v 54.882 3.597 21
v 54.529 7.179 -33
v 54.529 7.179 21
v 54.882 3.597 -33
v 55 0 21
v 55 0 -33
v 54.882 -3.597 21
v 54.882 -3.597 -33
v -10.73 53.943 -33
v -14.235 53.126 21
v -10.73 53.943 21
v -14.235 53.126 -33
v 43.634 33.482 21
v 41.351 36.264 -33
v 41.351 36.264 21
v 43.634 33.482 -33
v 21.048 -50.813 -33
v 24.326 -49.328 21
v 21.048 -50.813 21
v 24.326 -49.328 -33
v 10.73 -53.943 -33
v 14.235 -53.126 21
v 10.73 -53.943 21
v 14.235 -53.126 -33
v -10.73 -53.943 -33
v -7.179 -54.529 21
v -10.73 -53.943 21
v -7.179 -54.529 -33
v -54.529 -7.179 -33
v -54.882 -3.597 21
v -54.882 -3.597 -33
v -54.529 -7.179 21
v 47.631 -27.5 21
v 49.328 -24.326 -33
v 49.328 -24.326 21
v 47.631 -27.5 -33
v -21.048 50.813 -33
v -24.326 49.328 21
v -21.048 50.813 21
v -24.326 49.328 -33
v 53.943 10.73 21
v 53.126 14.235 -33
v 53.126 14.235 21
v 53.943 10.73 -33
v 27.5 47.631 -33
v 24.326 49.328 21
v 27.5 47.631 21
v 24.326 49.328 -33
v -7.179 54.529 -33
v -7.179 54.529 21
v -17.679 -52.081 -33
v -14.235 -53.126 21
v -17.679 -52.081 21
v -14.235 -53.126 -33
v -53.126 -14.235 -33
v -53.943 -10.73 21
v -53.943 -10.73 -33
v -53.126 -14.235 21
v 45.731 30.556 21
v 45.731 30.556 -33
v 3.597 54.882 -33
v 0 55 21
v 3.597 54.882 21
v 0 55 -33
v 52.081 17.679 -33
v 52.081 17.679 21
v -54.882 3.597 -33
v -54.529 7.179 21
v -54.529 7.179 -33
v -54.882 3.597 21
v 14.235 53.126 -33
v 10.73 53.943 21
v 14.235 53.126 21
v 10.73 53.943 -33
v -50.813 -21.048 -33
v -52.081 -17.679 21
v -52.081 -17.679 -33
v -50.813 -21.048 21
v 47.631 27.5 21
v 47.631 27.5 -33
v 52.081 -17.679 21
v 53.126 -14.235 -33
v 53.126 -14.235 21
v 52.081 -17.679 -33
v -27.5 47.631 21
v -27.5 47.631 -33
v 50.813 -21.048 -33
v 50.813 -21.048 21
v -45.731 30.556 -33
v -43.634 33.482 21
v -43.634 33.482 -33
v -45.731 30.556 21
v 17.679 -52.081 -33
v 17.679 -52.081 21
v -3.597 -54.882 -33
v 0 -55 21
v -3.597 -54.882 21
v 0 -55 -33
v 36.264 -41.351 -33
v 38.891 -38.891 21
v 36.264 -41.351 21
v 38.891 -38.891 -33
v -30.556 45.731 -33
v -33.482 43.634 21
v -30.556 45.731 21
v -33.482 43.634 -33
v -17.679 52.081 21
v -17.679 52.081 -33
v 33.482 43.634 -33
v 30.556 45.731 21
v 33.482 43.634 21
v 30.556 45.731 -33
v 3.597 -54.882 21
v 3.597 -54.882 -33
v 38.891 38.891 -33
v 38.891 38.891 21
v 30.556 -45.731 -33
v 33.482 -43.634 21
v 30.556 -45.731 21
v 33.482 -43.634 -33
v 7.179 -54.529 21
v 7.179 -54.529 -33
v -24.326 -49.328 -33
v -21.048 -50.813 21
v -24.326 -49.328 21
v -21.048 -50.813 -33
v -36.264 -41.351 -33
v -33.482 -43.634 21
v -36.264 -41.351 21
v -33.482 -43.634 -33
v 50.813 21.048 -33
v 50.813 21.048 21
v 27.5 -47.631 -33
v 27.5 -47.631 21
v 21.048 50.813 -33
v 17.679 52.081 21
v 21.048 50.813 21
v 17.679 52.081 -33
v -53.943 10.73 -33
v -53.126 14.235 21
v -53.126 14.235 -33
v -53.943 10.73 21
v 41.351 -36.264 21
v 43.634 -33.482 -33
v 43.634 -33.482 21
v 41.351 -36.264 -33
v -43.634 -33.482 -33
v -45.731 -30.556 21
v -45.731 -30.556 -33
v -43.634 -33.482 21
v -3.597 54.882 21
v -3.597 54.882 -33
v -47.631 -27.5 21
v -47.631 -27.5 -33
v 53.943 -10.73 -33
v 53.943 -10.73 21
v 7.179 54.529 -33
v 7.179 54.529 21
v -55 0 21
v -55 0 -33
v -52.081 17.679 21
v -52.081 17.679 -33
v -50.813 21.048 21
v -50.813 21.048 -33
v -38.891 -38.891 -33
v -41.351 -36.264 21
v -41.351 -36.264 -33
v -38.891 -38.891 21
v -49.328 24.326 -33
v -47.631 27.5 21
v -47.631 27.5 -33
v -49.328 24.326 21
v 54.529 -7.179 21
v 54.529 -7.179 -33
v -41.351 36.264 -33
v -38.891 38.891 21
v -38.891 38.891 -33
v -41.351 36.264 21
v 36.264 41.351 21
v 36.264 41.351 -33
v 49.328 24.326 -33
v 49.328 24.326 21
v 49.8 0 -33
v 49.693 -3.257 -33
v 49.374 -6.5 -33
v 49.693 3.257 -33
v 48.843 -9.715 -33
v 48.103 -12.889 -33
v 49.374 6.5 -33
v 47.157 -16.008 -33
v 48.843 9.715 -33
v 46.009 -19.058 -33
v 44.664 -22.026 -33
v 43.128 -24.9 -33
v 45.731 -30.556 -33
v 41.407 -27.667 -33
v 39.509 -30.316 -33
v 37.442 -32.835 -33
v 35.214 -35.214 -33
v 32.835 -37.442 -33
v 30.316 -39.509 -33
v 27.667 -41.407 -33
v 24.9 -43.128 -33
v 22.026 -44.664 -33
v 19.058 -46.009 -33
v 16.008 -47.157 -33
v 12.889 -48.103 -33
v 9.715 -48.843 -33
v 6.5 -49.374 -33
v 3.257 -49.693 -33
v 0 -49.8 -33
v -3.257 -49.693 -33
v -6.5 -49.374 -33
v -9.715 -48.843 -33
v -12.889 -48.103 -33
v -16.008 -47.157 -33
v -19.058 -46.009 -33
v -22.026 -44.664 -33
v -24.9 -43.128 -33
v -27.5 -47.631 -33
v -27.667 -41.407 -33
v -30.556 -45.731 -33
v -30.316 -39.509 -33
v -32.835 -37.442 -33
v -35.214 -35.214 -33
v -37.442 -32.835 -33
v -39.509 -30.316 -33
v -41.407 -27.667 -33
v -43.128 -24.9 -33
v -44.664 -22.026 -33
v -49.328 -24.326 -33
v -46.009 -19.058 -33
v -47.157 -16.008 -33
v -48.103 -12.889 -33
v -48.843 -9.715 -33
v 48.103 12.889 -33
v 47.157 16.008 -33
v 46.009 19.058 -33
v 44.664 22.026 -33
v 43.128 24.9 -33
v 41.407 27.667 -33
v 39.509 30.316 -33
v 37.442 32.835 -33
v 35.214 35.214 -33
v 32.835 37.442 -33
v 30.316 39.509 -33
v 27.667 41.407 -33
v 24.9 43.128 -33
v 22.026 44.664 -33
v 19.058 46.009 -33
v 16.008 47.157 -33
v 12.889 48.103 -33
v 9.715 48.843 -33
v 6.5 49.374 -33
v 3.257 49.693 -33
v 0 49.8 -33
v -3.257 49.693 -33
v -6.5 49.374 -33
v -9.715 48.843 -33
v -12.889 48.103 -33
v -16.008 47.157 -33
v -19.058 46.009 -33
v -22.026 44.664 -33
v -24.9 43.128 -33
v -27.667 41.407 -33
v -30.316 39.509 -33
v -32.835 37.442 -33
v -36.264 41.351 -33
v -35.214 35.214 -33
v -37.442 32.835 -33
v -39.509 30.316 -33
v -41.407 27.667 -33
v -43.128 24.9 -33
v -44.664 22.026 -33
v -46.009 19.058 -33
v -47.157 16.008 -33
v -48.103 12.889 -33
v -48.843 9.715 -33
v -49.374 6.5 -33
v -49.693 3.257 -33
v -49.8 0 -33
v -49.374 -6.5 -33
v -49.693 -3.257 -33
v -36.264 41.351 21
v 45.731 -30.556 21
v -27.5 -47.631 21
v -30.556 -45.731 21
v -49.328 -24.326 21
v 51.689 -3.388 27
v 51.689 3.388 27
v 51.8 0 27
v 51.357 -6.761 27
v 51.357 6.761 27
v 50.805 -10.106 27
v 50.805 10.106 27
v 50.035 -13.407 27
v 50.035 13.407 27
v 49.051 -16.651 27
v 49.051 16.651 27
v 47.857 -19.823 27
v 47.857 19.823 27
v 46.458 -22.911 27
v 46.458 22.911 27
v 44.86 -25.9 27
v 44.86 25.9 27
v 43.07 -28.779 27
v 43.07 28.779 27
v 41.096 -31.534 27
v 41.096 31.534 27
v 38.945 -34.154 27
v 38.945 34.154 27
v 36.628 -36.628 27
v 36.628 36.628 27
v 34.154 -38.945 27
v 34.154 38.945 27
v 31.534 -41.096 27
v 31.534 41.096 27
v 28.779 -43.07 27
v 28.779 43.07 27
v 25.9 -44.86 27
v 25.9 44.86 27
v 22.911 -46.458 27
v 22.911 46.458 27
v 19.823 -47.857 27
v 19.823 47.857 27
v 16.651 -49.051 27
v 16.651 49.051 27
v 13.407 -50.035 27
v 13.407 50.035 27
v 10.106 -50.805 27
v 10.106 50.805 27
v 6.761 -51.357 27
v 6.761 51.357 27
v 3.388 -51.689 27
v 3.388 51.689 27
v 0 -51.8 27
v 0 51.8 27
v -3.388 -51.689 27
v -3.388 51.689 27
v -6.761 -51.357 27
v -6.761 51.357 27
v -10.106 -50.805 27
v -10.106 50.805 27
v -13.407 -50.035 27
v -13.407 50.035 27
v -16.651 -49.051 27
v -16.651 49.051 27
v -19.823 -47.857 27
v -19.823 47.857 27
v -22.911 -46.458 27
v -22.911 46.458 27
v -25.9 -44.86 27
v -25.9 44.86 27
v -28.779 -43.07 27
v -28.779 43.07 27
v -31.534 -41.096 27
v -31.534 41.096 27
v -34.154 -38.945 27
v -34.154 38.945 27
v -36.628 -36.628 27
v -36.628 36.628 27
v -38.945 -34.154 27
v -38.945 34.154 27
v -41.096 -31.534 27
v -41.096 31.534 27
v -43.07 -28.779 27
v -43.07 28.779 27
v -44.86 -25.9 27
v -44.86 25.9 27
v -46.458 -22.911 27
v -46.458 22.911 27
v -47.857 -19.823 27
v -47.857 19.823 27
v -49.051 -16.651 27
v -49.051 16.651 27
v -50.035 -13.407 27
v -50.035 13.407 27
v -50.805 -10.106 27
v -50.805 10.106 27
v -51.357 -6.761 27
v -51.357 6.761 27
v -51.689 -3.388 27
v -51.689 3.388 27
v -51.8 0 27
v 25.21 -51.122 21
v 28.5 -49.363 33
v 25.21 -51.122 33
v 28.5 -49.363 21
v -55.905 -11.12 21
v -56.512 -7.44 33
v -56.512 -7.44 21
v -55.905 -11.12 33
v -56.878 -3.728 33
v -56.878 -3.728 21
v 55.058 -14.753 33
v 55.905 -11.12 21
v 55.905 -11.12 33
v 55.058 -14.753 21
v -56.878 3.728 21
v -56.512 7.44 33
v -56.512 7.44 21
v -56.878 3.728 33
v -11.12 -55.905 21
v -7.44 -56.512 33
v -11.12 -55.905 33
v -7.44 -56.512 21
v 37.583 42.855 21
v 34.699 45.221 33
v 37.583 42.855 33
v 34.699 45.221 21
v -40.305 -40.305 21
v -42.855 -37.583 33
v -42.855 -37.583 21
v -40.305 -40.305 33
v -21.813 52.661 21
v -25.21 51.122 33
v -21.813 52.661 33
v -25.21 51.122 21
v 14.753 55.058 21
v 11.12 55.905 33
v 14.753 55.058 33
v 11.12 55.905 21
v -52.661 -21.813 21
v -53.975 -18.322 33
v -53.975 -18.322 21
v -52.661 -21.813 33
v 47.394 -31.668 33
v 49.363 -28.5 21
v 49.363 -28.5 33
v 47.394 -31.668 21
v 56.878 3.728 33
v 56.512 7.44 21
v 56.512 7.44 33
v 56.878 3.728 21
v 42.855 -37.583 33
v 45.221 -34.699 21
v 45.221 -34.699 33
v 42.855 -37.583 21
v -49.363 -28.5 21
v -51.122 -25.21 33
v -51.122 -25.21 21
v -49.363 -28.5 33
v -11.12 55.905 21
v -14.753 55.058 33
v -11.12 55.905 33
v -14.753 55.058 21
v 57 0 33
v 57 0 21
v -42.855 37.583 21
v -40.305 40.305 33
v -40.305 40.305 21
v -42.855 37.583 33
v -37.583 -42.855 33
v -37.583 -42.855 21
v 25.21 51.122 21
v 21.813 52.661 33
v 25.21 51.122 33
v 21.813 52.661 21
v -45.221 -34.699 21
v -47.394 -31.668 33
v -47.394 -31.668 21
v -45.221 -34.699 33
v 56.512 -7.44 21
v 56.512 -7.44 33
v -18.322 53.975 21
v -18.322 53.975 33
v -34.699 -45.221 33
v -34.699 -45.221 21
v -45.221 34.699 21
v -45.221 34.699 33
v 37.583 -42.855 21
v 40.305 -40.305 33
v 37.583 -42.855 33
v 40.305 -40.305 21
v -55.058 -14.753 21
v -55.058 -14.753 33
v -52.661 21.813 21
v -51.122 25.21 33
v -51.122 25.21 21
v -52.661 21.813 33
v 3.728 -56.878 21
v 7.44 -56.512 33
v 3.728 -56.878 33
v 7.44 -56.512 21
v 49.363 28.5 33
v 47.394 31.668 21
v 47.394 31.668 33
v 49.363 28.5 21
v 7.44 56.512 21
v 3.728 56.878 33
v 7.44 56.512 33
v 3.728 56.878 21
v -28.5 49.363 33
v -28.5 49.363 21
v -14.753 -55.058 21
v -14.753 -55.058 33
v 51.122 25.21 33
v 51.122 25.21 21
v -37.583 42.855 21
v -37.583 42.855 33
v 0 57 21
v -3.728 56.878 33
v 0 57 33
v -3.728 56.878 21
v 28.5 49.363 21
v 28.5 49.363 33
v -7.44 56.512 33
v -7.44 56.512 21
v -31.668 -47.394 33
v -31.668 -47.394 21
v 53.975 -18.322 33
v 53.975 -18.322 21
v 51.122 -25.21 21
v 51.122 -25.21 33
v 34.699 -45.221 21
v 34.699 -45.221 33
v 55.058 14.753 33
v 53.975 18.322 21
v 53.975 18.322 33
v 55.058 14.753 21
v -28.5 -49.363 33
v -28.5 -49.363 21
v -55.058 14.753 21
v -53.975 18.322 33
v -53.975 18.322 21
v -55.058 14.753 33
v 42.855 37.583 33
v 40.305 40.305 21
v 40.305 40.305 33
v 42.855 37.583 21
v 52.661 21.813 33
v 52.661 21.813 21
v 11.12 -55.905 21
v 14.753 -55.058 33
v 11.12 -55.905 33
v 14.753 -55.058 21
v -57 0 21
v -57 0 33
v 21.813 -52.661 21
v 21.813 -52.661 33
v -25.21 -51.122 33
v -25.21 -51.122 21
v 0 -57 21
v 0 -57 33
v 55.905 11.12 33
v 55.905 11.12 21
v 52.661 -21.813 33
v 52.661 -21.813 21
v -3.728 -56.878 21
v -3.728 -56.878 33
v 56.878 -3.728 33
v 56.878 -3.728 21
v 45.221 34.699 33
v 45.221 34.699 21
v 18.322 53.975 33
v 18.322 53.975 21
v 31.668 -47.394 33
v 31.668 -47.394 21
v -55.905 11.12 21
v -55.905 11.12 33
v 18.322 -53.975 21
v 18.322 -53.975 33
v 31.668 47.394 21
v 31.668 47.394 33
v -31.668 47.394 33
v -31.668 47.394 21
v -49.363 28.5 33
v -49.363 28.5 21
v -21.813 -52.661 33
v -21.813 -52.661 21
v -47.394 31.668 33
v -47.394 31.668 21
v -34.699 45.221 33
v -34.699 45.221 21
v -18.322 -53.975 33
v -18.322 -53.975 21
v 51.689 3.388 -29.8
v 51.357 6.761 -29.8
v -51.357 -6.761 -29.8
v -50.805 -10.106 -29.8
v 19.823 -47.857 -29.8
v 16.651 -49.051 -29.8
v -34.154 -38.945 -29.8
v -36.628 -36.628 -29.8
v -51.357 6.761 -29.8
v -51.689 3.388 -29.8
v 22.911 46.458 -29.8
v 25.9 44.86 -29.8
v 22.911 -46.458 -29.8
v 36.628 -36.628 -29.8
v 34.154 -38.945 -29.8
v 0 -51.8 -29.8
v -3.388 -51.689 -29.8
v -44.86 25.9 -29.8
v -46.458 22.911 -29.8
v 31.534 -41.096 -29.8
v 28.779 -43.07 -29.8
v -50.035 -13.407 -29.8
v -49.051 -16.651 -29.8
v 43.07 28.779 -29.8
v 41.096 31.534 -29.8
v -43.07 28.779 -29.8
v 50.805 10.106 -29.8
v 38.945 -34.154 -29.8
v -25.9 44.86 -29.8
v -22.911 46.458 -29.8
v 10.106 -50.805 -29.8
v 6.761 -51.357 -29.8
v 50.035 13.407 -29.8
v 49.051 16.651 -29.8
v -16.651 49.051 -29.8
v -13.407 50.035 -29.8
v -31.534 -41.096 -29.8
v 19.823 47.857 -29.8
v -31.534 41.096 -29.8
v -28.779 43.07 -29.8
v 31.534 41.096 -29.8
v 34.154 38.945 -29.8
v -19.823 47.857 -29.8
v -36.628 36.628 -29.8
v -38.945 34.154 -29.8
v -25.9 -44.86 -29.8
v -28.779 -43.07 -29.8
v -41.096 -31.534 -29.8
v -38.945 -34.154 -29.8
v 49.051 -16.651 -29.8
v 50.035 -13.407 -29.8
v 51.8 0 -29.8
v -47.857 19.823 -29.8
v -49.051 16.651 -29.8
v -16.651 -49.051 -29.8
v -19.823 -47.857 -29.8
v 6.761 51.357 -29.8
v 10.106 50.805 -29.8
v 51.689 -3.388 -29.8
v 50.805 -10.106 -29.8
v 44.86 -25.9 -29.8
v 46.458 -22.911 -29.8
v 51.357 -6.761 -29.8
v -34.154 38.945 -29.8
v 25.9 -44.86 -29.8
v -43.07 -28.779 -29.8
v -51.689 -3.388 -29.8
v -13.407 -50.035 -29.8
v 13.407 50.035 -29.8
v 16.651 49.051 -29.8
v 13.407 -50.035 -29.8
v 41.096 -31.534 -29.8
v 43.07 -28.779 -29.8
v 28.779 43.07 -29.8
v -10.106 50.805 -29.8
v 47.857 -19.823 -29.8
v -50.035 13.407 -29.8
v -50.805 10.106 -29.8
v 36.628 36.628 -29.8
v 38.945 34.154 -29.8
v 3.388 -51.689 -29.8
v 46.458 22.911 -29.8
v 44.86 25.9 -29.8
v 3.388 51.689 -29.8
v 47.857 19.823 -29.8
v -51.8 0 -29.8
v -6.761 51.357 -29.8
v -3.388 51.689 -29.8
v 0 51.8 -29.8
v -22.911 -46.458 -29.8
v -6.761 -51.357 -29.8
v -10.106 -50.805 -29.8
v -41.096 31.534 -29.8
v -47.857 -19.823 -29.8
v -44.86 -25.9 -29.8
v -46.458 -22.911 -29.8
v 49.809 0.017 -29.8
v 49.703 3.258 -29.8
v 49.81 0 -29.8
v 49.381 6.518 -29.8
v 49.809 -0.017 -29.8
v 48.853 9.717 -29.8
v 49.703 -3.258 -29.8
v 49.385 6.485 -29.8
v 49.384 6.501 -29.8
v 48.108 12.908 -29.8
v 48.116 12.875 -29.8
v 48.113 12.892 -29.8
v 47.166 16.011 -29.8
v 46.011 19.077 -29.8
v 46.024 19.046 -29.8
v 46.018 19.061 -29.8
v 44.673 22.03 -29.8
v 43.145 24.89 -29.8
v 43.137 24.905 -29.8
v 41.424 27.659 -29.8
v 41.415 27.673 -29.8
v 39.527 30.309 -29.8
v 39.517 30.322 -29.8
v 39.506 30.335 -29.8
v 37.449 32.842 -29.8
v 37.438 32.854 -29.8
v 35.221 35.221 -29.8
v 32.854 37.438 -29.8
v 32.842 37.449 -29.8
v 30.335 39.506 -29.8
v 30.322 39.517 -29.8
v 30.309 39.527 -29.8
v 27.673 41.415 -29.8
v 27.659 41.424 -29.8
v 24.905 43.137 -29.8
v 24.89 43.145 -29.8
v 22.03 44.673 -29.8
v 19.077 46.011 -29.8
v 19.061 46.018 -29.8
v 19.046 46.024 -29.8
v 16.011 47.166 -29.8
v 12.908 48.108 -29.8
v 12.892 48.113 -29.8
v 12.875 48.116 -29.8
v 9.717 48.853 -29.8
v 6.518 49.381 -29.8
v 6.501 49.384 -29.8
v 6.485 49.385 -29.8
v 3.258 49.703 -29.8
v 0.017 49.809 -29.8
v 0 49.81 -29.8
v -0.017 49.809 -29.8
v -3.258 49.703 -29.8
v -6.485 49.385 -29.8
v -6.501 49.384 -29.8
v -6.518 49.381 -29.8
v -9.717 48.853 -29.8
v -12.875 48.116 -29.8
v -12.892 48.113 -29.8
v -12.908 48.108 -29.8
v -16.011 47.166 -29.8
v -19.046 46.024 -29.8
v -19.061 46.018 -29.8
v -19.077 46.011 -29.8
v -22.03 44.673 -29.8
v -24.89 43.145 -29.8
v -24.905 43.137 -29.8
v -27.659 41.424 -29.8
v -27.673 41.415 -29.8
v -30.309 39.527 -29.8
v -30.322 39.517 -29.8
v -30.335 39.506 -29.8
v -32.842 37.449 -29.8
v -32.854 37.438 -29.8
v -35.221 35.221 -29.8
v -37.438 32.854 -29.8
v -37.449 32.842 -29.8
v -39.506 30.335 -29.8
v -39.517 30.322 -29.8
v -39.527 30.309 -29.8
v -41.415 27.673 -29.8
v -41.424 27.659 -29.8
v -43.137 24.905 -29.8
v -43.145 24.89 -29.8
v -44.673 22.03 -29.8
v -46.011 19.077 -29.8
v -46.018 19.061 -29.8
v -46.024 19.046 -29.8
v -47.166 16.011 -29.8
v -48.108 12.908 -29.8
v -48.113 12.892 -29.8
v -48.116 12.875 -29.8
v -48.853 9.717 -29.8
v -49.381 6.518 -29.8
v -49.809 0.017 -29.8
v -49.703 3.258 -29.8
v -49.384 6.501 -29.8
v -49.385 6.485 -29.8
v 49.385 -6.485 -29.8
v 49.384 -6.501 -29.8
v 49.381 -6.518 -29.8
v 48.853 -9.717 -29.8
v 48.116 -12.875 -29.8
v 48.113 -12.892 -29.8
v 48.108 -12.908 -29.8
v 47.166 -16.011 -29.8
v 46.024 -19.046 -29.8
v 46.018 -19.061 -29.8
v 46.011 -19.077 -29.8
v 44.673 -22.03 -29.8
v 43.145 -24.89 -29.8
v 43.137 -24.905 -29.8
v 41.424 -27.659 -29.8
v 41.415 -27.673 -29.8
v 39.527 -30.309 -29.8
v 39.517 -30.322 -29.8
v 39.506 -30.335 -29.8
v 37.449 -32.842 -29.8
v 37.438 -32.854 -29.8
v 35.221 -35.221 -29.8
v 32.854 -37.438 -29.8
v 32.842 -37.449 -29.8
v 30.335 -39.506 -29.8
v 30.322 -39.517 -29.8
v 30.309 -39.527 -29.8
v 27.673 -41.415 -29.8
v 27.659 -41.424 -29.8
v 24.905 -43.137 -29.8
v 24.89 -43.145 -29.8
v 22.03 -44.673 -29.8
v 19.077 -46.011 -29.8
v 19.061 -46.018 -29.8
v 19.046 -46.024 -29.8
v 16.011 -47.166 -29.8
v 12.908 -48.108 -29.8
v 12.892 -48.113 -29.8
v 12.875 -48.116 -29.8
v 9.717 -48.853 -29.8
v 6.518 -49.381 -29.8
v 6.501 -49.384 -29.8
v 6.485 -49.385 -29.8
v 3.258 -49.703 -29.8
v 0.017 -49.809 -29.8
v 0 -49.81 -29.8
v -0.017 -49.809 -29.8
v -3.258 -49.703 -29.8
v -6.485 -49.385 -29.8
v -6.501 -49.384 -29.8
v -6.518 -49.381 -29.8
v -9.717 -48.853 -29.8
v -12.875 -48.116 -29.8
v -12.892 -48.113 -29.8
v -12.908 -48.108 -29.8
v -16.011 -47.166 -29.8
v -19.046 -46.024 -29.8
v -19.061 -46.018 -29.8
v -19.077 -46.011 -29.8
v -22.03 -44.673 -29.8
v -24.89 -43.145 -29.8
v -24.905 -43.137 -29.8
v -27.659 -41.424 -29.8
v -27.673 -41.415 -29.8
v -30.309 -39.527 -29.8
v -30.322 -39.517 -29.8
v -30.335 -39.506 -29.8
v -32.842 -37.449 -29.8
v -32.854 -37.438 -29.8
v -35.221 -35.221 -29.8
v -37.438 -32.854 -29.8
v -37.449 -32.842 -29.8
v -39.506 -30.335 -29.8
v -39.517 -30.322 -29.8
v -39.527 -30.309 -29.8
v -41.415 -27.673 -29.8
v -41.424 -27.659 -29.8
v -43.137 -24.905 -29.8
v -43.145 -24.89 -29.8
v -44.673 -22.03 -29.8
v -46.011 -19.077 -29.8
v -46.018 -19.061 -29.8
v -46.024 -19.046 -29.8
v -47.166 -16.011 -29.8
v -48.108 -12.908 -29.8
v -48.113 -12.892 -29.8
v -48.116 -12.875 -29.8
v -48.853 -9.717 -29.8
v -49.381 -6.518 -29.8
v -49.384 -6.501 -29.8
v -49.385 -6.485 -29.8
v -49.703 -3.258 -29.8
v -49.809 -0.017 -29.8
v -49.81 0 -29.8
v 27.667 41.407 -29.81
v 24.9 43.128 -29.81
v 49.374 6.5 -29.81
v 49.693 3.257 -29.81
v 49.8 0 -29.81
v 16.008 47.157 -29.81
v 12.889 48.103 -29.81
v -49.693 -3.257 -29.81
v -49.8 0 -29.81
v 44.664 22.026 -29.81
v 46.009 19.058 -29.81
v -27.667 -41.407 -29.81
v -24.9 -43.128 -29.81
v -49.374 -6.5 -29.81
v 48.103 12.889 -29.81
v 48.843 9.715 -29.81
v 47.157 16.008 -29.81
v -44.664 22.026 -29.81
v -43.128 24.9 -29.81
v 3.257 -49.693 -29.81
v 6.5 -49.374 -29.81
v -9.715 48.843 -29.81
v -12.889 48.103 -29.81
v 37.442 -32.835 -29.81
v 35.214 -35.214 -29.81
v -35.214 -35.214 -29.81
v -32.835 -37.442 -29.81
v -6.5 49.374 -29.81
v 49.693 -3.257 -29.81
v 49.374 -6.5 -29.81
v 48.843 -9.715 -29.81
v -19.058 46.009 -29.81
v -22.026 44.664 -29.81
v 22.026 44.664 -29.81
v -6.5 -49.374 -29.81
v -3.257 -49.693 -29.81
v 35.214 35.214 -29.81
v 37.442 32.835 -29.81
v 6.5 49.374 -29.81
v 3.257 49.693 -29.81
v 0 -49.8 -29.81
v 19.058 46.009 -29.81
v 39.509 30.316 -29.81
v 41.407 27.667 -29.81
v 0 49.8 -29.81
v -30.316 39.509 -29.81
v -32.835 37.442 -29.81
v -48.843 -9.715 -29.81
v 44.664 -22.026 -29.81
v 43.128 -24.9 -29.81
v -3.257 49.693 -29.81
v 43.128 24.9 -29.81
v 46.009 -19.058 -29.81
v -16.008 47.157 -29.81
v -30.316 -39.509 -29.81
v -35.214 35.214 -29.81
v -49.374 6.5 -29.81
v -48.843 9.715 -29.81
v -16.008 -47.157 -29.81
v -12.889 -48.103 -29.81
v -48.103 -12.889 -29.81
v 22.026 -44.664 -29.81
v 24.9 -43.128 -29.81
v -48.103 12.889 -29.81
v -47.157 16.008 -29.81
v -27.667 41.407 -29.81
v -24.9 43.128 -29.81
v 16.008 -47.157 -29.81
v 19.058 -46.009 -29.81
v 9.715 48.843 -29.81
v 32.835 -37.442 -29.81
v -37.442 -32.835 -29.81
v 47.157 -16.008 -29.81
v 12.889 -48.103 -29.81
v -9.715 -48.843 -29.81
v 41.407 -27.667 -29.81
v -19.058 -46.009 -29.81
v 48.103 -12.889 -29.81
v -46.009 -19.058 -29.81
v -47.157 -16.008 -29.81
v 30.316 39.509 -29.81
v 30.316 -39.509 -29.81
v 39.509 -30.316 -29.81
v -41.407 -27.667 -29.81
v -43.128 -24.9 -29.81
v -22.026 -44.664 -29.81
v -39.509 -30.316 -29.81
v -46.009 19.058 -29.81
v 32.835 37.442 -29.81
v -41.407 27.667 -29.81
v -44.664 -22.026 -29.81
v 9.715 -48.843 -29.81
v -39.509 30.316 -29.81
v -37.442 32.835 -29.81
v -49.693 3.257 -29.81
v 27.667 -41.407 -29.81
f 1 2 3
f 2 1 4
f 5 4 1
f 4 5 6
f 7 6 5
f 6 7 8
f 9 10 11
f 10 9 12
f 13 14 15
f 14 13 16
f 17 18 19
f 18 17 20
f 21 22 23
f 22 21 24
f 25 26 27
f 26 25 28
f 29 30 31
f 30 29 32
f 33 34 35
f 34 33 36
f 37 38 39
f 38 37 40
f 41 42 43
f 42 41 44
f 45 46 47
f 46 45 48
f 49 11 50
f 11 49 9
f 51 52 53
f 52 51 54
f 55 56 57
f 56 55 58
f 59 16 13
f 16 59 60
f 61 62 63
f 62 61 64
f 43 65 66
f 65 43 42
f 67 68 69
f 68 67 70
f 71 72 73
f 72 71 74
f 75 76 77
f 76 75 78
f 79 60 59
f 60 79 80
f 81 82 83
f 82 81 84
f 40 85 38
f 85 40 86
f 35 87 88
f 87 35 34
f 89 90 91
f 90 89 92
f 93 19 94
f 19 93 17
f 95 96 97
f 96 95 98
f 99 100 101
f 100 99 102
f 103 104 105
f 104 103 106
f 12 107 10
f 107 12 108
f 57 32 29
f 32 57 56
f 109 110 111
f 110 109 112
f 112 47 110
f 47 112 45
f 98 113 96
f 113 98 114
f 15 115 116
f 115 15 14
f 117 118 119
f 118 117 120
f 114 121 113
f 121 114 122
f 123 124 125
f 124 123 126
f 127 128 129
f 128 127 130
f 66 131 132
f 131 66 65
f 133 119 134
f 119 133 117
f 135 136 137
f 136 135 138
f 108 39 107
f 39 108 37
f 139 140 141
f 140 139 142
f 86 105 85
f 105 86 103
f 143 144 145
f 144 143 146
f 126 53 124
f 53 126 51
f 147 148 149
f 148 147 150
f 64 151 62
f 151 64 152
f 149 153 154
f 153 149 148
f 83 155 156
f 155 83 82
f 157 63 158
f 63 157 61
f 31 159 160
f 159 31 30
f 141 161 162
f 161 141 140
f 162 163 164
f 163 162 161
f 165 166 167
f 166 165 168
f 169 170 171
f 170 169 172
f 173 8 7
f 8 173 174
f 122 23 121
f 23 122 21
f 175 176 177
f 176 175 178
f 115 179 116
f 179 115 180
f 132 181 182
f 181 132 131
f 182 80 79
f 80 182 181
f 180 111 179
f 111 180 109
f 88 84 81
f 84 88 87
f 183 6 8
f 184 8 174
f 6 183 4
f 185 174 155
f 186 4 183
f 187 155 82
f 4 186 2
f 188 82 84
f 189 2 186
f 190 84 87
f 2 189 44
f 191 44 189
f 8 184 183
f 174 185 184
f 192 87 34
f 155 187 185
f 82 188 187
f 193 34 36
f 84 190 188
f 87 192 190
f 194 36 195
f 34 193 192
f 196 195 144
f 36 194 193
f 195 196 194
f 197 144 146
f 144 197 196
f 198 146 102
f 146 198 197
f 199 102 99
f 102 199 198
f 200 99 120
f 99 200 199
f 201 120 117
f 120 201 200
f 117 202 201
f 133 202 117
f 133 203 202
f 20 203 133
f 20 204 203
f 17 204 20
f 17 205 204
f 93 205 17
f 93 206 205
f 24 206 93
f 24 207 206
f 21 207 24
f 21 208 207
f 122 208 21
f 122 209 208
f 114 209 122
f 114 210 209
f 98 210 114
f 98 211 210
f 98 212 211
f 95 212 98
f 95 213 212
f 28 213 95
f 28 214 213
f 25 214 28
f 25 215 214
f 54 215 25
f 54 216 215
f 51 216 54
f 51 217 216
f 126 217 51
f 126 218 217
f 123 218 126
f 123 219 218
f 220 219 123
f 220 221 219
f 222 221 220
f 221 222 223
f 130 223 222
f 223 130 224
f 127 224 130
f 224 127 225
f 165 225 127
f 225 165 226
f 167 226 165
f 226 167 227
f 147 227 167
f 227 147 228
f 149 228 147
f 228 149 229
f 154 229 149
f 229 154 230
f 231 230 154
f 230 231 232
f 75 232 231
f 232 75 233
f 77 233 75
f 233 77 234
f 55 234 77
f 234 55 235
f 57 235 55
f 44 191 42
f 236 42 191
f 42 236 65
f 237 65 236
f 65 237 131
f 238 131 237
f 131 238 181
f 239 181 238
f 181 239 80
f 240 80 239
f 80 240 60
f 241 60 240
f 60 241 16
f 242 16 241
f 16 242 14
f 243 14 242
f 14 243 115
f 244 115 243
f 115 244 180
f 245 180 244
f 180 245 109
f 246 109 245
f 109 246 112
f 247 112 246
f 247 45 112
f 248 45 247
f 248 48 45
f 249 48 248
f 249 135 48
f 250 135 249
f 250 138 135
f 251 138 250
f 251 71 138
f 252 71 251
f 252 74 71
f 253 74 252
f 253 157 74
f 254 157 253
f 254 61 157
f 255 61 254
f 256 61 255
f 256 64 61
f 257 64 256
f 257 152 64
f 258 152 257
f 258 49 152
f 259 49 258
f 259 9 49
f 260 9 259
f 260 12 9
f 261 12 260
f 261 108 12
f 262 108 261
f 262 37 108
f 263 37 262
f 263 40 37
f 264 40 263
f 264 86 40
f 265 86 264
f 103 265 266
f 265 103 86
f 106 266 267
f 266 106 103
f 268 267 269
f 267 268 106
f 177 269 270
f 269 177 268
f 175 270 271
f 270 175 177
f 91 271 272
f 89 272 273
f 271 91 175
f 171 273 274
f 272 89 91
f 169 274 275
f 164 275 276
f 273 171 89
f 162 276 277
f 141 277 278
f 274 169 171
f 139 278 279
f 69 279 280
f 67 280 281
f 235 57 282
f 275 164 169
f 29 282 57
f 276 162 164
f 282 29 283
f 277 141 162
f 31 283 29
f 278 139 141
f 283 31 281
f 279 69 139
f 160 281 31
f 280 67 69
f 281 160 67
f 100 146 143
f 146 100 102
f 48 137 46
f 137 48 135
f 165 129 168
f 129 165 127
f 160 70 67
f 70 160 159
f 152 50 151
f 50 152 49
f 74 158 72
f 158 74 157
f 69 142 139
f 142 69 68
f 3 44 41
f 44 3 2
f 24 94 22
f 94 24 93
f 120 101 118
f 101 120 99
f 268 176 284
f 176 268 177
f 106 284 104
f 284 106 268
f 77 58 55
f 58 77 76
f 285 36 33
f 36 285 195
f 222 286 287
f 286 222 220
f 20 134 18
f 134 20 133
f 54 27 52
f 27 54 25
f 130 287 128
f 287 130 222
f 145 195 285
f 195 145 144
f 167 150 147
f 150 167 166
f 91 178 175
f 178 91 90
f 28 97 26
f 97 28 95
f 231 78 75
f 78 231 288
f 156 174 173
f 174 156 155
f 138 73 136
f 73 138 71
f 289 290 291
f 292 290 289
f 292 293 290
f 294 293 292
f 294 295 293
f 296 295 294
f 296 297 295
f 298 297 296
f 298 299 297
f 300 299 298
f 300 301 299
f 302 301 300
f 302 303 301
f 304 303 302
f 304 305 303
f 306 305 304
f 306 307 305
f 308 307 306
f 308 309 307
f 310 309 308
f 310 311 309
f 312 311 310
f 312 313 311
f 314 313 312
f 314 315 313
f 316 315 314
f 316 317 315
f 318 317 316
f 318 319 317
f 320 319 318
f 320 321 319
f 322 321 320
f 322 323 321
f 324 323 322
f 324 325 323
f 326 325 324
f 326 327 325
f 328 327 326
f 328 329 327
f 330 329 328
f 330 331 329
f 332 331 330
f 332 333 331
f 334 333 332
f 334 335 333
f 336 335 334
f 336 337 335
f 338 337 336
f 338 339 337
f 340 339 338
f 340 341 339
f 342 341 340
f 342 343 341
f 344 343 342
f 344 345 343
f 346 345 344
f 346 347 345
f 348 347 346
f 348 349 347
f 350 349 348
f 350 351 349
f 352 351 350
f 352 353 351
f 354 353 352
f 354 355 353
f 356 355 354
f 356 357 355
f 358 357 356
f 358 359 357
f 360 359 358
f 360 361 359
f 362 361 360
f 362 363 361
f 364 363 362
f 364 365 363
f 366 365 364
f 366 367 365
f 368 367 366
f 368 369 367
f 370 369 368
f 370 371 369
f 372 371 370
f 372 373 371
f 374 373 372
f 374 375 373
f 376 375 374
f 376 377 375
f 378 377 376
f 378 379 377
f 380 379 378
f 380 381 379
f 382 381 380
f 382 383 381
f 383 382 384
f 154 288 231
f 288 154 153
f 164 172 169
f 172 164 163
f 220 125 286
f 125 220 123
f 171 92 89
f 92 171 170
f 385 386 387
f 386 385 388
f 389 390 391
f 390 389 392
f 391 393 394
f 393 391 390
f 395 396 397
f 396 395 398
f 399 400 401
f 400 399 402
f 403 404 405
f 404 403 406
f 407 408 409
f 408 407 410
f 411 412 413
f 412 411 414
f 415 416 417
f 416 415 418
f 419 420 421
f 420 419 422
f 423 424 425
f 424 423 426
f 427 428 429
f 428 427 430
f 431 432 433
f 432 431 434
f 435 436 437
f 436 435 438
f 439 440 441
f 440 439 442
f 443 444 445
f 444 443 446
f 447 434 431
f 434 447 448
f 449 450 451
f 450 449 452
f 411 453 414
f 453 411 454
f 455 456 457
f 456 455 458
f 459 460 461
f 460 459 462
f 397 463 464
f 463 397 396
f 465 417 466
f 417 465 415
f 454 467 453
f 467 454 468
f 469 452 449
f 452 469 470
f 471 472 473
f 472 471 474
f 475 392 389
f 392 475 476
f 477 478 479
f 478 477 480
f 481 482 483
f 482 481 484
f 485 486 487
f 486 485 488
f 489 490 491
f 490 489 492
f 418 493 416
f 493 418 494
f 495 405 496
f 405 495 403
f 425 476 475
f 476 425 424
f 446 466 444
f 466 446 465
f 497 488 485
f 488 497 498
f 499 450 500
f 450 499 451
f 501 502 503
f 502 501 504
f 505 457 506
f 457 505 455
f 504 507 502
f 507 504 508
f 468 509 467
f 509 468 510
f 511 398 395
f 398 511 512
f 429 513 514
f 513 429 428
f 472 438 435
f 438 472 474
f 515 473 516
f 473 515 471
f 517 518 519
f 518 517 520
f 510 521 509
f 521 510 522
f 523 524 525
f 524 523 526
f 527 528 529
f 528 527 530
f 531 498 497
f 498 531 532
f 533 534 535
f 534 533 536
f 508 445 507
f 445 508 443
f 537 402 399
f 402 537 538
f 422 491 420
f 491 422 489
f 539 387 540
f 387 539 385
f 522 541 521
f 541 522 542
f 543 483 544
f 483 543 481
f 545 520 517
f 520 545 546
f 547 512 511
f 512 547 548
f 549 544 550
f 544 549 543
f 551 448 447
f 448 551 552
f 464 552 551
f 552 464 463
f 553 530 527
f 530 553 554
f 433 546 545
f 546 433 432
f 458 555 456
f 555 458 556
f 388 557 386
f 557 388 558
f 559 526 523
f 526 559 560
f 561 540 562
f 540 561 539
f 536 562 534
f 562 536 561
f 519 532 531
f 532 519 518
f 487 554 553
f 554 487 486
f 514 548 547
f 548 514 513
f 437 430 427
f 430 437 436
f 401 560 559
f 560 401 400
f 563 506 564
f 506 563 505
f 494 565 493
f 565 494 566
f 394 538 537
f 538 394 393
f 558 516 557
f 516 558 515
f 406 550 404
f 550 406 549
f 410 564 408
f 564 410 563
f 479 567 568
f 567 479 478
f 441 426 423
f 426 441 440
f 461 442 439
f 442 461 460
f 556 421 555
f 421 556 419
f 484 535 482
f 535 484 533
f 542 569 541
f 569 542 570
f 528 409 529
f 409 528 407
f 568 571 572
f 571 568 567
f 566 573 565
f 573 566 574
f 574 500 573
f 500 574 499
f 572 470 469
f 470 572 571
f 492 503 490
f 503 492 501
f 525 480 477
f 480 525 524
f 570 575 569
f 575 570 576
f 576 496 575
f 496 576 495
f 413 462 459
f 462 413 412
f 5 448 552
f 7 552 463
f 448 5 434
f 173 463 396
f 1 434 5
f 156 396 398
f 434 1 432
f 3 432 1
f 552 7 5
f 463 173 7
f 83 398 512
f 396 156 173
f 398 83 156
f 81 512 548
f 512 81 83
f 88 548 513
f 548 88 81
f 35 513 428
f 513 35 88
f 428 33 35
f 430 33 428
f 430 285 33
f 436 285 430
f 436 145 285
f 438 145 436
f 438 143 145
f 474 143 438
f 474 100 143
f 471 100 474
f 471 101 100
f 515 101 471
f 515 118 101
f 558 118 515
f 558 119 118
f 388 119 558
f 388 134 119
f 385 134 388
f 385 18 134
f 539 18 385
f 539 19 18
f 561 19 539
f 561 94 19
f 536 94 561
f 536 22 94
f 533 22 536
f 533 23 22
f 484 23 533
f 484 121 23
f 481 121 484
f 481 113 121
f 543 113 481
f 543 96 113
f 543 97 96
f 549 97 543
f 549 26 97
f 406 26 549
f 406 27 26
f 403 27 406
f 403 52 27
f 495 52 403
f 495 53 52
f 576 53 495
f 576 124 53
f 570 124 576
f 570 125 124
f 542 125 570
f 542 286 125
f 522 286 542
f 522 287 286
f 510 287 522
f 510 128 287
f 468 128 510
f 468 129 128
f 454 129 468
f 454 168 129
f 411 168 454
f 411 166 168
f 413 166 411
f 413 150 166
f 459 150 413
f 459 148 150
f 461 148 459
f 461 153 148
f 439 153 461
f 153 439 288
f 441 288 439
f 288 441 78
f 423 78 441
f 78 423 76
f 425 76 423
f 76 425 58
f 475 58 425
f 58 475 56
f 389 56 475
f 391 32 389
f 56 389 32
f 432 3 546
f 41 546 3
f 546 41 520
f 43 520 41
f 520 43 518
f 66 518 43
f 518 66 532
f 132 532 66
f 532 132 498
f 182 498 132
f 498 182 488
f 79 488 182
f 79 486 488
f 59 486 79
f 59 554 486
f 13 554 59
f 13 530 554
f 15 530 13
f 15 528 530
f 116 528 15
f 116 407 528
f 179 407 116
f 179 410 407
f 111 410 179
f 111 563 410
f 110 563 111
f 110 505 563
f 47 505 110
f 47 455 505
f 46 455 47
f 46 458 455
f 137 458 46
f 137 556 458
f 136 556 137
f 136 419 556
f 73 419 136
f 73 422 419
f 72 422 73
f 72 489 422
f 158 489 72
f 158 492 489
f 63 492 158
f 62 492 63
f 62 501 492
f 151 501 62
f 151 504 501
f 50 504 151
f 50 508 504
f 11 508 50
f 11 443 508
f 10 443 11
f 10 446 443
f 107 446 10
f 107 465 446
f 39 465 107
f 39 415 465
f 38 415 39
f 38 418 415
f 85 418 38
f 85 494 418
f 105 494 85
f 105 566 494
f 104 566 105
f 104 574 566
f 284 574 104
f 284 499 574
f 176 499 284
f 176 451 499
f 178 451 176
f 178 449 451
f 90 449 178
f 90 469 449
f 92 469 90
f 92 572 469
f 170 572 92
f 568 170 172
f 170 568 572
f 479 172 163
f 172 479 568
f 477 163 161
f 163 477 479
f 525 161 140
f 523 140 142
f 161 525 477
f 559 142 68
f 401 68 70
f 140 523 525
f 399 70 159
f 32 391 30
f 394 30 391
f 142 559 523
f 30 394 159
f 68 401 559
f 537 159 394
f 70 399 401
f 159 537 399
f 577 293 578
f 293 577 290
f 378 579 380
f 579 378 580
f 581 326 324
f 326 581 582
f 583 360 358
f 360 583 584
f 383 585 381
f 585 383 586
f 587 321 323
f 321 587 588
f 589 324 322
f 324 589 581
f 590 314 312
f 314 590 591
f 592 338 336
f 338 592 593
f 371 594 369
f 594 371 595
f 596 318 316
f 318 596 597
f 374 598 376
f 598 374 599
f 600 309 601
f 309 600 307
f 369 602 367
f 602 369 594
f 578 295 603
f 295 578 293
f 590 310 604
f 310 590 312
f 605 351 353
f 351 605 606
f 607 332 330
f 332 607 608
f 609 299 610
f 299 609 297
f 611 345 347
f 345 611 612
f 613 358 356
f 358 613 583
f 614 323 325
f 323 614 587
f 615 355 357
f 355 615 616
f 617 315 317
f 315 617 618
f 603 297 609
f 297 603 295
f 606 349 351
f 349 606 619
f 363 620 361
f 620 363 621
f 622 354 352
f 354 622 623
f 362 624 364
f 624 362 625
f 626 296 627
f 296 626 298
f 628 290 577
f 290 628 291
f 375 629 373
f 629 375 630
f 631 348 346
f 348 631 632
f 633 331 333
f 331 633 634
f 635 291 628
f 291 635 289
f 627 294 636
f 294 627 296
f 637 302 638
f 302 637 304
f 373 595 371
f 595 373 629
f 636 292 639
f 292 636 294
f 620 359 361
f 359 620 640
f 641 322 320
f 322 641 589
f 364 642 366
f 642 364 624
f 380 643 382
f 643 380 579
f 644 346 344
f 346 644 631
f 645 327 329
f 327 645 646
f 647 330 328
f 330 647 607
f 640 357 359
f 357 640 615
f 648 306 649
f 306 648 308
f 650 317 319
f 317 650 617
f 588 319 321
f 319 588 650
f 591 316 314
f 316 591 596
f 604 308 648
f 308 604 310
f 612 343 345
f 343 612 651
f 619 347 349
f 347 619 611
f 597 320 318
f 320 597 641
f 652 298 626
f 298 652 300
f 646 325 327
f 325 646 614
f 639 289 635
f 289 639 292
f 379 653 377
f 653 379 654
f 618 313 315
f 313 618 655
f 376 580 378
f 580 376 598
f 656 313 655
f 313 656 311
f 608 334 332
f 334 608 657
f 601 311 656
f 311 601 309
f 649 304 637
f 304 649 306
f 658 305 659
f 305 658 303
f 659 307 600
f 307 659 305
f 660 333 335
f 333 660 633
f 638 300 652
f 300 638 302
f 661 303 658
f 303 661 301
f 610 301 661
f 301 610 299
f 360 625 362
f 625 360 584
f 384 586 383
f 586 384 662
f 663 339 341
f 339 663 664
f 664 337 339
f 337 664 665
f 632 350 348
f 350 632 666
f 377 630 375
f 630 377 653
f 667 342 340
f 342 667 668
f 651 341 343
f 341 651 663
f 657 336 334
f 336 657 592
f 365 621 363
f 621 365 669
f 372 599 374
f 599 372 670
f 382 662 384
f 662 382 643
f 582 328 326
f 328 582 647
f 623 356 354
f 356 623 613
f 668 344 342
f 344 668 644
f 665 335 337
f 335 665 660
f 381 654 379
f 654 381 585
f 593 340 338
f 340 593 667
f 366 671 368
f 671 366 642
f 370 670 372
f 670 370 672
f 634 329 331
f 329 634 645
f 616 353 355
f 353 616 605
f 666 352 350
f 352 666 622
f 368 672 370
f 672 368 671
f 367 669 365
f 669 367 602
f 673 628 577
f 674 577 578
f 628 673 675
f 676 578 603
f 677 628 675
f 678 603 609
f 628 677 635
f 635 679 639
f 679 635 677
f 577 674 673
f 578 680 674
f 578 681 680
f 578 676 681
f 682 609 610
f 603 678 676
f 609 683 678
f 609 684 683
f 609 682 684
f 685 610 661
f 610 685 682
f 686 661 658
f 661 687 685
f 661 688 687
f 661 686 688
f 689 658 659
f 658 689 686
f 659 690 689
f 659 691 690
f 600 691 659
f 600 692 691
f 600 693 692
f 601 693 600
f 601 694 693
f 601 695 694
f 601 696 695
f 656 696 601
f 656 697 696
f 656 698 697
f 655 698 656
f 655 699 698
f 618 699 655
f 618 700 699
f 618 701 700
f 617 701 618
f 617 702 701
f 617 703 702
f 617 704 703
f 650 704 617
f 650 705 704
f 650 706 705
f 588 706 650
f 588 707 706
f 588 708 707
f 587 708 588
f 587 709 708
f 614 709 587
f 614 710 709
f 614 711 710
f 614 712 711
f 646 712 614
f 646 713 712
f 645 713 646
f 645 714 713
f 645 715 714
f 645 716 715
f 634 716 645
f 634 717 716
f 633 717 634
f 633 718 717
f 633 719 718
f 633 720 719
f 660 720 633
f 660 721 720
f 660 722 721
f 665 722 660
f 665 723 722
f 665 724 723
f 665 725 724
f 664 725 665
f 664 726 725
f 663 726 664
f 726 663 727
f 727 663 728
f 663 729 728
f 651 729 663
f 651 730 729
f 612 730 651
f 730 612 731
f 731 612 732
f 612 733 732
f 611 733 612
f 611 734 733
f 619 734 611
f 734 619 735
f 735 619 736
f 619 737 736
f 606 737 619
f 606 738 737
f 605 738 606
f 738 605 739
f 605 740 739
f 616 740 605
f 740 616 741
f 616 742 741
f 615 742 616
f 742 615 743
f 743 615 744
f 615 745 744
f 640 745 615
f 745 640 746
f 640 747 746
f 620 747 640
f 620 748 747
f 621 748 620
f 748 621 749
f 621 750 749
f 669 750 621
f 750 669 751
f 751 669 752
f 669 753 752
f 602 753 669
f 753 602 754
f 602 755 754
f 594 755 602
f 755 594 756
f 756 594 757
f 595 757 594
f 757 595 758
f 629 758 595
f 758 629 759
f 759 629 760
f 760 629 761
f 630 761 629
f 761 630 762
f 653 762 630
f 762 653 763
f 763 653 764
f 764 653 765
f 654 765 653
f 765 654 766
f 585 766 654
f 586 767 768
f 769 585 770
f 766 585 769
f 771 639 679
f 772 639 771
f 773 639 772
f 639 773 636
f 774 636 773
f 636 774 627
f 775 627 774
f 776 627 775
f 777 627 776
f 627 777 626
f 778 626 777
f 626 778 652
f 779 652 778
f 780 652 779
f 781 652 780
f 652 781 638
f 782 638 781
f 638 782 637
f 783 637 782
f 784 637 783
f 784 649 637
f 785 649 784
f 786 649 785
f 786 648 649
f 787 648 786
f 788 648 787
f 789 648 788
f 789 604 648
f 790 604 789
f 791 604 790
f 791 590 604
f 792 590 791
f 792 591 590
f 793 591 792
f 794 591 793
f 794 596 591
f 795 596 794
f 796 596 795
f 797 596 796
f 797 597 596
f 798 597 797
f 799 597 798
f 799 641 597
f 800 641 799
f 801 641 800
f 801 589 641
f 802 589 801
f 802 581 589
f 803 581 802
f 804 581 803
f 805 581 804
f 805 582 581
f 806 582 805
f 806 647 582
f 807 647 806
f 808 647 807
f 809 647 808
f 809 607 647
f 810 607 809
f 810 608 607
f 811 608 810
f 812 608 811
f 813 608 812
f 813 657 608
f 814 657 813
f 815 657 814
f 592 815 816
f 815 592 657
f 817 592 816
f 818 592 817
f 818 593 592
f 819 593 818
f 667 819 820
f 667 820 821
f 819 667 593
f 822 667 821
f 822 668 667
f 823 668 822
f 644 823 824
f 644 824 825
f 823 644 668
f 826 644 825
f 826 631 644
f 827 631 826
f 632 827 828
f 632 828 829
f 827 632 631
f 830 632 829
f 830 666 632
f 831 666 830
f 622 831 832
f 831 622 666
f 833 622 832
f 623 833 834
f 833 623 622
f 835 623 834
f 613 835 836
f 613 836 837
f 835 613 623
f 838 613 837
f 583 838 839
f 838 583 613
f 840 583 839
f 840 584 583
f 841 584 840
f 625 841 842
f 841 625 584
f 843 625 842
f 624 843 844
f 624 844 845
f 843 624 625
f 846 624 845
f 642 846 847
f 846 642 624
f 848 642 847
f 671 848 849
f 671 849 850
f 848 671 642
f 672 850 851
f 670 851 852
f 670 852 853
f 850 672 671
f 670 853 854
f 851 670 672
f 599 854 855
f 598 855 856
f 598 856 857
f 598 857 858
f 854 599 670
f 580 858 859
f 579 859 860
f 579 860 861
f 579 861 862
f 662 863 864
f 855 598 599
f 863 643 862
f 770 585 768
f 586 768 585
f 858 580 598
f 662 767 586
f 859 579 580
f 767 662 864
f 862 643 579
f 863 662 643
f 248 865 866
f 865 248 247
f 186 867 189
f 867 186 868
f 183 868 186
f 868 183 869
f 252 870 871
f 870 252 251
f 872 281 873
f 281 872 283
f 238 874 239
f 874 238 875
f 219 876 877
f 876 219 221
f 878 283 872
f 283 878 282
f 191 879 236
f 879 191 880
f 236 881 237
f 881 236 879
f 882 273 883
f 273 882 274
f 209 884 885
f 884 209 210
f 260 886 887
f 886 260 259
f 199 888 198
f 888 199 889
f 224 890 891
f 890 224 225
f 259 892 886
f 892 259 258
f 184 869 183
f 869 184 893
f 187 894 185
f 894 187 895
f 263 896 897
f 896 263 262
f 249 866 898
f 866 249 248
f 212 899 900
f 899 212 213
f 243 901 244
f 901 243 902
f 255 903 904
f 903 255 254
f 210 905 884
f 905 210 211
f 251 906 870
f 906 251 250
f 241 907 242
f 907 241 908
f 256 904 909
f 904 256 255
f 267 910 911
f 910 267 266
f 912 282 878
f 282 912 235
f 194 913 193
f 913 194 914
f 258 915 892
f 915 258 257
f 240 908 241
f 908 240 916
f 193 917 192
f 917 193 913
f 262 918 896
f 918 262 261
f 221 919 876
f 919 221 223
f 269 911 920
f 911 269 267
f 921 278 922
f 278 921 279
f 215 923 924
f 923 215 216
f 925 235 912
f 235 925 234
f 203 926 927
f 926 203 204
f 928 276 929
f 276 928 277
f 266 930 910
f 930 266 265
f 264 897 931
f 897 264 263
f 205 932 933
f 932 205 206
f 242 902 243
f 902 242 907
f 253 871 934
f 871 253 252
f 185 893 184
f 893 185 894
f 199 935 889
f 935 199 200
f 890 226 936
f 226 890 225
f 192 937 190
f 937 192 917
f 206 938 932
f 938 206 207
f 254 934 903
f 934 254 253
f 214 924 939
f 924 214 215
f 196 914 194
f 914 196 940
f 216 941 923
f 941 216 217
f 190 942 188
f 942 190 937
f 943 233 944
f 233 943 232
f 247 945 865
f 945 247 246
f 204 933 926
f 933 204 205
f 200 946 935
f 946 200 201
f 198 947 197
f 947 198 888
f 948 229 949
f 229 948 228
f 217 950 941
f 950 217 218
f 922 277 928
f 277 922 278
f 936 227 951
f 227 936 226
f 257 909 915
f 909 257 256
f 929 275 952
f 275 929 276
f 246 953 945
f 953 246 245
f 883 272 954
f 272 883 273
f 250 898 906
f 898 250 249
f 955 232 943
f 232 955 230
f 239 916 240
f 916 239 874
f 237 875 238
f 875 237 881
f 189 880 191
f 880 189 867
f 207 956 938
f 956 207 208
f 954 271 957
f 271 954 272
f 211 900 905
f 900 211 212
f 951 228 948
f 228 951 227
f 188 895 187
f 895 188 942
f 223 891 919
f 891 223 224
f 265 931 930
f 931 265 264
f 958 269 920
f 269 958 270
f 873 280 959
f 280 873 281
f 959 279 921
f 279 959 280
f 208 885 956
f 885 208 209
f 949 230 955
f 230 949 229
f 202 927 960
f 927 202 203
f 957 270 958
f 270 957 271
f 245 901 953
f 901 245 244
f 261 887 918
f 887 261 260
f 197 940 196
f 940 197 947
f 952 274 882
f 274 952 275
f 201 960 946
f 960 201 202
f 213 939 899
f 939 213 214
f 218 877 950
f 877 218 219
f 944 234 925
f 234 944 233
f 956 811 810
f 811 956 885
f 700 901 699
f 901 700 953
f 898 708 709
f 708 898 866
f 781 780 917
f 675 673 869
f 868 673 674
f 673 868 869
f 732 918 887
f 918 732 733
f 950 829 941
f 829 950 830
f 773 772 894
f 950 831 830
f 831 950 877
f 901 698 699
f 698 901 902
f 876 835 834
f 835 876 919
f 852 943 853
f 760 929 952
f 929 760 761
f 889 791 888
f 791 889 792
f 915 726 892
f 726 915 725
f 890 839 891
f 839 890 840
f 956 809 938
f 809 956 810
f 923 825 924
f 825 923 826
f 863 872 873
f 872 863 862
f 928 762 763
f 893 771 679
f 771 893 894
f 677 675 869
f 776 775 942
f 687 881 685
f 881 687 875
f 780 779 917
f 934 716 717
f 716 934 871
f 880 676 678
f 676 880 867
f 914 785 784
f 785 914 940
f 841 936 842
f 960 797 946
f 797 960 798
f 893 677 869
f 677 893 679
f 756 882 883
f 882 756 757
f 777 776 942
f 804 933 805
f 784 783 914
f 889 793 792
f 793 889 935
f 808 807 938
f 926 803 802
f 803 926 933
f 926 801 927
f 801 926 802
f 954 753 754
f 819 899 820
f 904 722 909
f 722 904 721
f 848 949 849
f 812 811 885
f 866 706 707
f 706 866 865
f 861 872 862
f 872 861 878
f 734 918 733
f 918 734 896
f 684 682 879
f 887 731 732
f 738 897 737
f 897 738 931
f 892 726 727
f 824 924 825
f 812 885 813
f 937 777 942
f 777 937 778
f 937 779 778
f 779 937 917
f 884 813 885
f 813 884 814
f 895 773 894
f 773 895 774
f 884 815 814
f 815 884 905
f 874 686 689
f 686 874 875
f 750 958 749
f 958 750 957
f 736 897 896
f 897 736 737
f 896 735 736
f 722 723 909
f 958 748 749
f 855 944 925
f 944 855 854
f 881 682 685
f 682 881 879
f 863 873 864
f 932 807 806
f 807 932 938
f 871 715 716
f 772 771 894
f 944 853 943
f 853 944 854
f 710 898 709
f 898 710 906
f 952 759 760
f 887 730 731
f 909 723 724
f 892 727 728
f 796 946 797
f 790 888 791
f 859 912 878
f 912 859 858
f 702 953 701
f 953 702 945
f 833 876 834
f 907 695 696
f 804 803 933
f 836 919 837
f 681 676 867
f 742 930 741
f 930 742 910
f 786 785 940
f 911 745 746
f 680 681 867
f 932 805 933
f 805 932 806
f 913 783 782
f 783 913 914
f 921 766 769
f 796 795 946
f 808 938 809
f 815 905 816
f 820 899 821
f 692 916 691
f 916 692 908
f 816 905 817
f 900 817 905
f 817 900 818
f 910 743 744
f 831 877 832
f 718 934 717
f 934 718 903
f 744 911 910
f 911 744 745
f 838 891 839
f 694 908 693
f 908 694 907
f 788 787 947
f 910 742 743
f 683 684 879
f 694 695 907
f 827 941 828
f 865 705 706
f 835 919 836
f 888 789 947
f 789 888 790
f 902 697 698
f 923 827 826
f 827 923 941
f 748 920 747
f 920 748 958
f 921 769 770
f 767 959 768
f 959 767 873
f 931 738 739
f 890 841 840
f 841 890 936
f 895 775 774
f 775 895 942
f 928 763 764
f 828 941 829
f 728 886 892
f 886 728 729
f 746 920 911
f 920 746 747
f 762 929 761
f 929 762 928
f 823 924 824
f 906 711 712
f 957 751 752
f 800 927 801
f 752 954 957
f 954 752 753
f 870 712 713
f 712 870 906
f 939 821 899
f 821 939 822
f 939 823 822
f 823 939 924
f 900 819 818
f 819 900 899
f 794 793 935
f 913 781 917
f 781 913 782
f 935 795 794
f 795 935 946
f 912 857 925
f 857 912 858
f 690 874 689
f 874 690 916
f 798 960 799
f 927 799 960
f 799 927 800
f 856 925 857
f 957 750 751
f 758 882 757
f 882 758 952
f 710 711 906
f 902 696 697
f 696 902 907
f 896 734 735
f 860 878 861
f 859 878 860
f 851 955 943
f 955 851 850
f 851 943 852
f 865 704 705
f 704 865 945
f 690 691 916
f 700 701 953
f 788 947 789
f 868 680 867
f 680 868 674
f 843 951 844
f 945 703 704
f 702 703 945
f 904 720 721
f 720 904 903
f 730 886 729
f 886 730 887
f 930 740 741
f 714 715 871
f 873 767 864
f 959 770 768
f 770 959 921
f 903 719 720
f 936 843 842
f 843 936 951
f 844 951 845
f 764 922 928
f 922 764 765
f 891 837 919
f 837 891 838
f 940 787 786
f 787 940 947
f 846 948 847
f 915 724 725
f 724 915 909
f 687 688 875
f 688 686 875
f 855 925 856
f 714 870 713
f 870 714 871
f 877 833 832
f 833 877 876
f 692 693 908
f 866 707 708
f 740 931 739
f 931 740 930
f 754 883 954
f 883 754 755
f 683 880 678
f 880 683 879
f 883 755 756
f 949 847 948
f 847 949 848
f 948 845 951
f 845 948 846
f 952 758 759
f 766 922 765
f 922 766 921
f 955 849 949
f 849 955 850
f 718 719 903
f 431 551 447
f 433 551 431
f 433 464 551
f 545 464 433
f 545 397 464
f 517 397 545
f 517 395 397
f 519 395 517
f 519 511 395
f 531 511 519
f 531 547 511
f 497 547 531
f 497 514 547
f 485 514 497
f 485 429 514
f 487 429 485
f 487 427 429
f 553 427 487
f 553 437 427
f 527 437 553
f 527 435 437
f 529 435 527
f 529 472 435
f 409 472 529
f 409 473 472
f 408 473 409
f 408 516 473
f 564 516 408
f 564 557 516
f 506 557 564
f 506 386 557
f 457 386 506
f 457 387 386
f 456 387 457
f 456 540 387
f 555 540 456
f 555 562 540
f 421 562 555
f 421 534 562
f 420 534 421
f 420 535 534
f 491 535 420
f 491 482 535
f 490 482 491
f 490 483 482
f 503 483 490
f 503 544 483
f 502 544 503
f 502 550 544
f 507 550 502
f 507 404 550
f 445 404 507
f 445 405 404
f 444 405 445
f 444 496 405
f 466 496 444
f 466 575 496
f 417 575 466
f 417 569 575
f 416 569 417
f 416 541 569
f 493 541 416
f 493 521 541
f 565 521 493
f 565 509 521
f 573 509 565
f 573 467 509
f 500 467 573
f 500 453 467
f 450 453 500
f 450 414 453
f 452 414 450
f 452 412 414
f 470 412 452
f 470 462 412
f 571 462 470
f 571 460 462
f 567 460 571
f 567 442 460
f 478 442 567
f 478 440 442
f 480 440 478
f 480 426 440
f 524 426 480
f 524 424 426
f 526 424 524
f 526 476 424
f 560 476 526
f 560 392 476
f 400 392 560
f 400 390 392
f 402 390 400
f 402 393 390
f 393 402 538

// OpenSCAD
$fn=96;

module ht_socket(od=110, wall=3.2, h=60, lip_h=6, lip_extra=2.0, chamfer=2.0){
    difference(){
        union(){
            cylinder(h=h, d=od);
            translate([0,0,h-lip_h]) cylinder(h=lip_h, d=od+2*lip_extra);
        }
        translate([0,0,wall]) cylinder(h=h+2, d=od-2*wall);
        translate([0,0,-0.1]) cylinder(h=wall+0.2, d=od-2*wall-2*chamfer);
        translate([0,0,wall-0.01]) cylinder(h=chamfer+0.02, d1=od-2*wall-2*chamfer, d2=od-2*wall);
    }
}

module ht_cap(od=110, wall=3.2, socket_h=60, top_th=6, lip_h=6, lip_extra=2.0){
    union(){
        ht_socket(od=od, wall=wall, h=socket_h, lip_h=lip_h, lip_extra=lip_extra, chamfer=2.0);
        translate([0,0,socket_h]) cylinder(h=top_th, d=od+2*lip_extra);
    }
}

translate([0,0,-(60+6)/2]) ht_cap(od=110, wall=3.2, socket_h=60, top_th=6, lip_h=6, lip_extra=2.0);
